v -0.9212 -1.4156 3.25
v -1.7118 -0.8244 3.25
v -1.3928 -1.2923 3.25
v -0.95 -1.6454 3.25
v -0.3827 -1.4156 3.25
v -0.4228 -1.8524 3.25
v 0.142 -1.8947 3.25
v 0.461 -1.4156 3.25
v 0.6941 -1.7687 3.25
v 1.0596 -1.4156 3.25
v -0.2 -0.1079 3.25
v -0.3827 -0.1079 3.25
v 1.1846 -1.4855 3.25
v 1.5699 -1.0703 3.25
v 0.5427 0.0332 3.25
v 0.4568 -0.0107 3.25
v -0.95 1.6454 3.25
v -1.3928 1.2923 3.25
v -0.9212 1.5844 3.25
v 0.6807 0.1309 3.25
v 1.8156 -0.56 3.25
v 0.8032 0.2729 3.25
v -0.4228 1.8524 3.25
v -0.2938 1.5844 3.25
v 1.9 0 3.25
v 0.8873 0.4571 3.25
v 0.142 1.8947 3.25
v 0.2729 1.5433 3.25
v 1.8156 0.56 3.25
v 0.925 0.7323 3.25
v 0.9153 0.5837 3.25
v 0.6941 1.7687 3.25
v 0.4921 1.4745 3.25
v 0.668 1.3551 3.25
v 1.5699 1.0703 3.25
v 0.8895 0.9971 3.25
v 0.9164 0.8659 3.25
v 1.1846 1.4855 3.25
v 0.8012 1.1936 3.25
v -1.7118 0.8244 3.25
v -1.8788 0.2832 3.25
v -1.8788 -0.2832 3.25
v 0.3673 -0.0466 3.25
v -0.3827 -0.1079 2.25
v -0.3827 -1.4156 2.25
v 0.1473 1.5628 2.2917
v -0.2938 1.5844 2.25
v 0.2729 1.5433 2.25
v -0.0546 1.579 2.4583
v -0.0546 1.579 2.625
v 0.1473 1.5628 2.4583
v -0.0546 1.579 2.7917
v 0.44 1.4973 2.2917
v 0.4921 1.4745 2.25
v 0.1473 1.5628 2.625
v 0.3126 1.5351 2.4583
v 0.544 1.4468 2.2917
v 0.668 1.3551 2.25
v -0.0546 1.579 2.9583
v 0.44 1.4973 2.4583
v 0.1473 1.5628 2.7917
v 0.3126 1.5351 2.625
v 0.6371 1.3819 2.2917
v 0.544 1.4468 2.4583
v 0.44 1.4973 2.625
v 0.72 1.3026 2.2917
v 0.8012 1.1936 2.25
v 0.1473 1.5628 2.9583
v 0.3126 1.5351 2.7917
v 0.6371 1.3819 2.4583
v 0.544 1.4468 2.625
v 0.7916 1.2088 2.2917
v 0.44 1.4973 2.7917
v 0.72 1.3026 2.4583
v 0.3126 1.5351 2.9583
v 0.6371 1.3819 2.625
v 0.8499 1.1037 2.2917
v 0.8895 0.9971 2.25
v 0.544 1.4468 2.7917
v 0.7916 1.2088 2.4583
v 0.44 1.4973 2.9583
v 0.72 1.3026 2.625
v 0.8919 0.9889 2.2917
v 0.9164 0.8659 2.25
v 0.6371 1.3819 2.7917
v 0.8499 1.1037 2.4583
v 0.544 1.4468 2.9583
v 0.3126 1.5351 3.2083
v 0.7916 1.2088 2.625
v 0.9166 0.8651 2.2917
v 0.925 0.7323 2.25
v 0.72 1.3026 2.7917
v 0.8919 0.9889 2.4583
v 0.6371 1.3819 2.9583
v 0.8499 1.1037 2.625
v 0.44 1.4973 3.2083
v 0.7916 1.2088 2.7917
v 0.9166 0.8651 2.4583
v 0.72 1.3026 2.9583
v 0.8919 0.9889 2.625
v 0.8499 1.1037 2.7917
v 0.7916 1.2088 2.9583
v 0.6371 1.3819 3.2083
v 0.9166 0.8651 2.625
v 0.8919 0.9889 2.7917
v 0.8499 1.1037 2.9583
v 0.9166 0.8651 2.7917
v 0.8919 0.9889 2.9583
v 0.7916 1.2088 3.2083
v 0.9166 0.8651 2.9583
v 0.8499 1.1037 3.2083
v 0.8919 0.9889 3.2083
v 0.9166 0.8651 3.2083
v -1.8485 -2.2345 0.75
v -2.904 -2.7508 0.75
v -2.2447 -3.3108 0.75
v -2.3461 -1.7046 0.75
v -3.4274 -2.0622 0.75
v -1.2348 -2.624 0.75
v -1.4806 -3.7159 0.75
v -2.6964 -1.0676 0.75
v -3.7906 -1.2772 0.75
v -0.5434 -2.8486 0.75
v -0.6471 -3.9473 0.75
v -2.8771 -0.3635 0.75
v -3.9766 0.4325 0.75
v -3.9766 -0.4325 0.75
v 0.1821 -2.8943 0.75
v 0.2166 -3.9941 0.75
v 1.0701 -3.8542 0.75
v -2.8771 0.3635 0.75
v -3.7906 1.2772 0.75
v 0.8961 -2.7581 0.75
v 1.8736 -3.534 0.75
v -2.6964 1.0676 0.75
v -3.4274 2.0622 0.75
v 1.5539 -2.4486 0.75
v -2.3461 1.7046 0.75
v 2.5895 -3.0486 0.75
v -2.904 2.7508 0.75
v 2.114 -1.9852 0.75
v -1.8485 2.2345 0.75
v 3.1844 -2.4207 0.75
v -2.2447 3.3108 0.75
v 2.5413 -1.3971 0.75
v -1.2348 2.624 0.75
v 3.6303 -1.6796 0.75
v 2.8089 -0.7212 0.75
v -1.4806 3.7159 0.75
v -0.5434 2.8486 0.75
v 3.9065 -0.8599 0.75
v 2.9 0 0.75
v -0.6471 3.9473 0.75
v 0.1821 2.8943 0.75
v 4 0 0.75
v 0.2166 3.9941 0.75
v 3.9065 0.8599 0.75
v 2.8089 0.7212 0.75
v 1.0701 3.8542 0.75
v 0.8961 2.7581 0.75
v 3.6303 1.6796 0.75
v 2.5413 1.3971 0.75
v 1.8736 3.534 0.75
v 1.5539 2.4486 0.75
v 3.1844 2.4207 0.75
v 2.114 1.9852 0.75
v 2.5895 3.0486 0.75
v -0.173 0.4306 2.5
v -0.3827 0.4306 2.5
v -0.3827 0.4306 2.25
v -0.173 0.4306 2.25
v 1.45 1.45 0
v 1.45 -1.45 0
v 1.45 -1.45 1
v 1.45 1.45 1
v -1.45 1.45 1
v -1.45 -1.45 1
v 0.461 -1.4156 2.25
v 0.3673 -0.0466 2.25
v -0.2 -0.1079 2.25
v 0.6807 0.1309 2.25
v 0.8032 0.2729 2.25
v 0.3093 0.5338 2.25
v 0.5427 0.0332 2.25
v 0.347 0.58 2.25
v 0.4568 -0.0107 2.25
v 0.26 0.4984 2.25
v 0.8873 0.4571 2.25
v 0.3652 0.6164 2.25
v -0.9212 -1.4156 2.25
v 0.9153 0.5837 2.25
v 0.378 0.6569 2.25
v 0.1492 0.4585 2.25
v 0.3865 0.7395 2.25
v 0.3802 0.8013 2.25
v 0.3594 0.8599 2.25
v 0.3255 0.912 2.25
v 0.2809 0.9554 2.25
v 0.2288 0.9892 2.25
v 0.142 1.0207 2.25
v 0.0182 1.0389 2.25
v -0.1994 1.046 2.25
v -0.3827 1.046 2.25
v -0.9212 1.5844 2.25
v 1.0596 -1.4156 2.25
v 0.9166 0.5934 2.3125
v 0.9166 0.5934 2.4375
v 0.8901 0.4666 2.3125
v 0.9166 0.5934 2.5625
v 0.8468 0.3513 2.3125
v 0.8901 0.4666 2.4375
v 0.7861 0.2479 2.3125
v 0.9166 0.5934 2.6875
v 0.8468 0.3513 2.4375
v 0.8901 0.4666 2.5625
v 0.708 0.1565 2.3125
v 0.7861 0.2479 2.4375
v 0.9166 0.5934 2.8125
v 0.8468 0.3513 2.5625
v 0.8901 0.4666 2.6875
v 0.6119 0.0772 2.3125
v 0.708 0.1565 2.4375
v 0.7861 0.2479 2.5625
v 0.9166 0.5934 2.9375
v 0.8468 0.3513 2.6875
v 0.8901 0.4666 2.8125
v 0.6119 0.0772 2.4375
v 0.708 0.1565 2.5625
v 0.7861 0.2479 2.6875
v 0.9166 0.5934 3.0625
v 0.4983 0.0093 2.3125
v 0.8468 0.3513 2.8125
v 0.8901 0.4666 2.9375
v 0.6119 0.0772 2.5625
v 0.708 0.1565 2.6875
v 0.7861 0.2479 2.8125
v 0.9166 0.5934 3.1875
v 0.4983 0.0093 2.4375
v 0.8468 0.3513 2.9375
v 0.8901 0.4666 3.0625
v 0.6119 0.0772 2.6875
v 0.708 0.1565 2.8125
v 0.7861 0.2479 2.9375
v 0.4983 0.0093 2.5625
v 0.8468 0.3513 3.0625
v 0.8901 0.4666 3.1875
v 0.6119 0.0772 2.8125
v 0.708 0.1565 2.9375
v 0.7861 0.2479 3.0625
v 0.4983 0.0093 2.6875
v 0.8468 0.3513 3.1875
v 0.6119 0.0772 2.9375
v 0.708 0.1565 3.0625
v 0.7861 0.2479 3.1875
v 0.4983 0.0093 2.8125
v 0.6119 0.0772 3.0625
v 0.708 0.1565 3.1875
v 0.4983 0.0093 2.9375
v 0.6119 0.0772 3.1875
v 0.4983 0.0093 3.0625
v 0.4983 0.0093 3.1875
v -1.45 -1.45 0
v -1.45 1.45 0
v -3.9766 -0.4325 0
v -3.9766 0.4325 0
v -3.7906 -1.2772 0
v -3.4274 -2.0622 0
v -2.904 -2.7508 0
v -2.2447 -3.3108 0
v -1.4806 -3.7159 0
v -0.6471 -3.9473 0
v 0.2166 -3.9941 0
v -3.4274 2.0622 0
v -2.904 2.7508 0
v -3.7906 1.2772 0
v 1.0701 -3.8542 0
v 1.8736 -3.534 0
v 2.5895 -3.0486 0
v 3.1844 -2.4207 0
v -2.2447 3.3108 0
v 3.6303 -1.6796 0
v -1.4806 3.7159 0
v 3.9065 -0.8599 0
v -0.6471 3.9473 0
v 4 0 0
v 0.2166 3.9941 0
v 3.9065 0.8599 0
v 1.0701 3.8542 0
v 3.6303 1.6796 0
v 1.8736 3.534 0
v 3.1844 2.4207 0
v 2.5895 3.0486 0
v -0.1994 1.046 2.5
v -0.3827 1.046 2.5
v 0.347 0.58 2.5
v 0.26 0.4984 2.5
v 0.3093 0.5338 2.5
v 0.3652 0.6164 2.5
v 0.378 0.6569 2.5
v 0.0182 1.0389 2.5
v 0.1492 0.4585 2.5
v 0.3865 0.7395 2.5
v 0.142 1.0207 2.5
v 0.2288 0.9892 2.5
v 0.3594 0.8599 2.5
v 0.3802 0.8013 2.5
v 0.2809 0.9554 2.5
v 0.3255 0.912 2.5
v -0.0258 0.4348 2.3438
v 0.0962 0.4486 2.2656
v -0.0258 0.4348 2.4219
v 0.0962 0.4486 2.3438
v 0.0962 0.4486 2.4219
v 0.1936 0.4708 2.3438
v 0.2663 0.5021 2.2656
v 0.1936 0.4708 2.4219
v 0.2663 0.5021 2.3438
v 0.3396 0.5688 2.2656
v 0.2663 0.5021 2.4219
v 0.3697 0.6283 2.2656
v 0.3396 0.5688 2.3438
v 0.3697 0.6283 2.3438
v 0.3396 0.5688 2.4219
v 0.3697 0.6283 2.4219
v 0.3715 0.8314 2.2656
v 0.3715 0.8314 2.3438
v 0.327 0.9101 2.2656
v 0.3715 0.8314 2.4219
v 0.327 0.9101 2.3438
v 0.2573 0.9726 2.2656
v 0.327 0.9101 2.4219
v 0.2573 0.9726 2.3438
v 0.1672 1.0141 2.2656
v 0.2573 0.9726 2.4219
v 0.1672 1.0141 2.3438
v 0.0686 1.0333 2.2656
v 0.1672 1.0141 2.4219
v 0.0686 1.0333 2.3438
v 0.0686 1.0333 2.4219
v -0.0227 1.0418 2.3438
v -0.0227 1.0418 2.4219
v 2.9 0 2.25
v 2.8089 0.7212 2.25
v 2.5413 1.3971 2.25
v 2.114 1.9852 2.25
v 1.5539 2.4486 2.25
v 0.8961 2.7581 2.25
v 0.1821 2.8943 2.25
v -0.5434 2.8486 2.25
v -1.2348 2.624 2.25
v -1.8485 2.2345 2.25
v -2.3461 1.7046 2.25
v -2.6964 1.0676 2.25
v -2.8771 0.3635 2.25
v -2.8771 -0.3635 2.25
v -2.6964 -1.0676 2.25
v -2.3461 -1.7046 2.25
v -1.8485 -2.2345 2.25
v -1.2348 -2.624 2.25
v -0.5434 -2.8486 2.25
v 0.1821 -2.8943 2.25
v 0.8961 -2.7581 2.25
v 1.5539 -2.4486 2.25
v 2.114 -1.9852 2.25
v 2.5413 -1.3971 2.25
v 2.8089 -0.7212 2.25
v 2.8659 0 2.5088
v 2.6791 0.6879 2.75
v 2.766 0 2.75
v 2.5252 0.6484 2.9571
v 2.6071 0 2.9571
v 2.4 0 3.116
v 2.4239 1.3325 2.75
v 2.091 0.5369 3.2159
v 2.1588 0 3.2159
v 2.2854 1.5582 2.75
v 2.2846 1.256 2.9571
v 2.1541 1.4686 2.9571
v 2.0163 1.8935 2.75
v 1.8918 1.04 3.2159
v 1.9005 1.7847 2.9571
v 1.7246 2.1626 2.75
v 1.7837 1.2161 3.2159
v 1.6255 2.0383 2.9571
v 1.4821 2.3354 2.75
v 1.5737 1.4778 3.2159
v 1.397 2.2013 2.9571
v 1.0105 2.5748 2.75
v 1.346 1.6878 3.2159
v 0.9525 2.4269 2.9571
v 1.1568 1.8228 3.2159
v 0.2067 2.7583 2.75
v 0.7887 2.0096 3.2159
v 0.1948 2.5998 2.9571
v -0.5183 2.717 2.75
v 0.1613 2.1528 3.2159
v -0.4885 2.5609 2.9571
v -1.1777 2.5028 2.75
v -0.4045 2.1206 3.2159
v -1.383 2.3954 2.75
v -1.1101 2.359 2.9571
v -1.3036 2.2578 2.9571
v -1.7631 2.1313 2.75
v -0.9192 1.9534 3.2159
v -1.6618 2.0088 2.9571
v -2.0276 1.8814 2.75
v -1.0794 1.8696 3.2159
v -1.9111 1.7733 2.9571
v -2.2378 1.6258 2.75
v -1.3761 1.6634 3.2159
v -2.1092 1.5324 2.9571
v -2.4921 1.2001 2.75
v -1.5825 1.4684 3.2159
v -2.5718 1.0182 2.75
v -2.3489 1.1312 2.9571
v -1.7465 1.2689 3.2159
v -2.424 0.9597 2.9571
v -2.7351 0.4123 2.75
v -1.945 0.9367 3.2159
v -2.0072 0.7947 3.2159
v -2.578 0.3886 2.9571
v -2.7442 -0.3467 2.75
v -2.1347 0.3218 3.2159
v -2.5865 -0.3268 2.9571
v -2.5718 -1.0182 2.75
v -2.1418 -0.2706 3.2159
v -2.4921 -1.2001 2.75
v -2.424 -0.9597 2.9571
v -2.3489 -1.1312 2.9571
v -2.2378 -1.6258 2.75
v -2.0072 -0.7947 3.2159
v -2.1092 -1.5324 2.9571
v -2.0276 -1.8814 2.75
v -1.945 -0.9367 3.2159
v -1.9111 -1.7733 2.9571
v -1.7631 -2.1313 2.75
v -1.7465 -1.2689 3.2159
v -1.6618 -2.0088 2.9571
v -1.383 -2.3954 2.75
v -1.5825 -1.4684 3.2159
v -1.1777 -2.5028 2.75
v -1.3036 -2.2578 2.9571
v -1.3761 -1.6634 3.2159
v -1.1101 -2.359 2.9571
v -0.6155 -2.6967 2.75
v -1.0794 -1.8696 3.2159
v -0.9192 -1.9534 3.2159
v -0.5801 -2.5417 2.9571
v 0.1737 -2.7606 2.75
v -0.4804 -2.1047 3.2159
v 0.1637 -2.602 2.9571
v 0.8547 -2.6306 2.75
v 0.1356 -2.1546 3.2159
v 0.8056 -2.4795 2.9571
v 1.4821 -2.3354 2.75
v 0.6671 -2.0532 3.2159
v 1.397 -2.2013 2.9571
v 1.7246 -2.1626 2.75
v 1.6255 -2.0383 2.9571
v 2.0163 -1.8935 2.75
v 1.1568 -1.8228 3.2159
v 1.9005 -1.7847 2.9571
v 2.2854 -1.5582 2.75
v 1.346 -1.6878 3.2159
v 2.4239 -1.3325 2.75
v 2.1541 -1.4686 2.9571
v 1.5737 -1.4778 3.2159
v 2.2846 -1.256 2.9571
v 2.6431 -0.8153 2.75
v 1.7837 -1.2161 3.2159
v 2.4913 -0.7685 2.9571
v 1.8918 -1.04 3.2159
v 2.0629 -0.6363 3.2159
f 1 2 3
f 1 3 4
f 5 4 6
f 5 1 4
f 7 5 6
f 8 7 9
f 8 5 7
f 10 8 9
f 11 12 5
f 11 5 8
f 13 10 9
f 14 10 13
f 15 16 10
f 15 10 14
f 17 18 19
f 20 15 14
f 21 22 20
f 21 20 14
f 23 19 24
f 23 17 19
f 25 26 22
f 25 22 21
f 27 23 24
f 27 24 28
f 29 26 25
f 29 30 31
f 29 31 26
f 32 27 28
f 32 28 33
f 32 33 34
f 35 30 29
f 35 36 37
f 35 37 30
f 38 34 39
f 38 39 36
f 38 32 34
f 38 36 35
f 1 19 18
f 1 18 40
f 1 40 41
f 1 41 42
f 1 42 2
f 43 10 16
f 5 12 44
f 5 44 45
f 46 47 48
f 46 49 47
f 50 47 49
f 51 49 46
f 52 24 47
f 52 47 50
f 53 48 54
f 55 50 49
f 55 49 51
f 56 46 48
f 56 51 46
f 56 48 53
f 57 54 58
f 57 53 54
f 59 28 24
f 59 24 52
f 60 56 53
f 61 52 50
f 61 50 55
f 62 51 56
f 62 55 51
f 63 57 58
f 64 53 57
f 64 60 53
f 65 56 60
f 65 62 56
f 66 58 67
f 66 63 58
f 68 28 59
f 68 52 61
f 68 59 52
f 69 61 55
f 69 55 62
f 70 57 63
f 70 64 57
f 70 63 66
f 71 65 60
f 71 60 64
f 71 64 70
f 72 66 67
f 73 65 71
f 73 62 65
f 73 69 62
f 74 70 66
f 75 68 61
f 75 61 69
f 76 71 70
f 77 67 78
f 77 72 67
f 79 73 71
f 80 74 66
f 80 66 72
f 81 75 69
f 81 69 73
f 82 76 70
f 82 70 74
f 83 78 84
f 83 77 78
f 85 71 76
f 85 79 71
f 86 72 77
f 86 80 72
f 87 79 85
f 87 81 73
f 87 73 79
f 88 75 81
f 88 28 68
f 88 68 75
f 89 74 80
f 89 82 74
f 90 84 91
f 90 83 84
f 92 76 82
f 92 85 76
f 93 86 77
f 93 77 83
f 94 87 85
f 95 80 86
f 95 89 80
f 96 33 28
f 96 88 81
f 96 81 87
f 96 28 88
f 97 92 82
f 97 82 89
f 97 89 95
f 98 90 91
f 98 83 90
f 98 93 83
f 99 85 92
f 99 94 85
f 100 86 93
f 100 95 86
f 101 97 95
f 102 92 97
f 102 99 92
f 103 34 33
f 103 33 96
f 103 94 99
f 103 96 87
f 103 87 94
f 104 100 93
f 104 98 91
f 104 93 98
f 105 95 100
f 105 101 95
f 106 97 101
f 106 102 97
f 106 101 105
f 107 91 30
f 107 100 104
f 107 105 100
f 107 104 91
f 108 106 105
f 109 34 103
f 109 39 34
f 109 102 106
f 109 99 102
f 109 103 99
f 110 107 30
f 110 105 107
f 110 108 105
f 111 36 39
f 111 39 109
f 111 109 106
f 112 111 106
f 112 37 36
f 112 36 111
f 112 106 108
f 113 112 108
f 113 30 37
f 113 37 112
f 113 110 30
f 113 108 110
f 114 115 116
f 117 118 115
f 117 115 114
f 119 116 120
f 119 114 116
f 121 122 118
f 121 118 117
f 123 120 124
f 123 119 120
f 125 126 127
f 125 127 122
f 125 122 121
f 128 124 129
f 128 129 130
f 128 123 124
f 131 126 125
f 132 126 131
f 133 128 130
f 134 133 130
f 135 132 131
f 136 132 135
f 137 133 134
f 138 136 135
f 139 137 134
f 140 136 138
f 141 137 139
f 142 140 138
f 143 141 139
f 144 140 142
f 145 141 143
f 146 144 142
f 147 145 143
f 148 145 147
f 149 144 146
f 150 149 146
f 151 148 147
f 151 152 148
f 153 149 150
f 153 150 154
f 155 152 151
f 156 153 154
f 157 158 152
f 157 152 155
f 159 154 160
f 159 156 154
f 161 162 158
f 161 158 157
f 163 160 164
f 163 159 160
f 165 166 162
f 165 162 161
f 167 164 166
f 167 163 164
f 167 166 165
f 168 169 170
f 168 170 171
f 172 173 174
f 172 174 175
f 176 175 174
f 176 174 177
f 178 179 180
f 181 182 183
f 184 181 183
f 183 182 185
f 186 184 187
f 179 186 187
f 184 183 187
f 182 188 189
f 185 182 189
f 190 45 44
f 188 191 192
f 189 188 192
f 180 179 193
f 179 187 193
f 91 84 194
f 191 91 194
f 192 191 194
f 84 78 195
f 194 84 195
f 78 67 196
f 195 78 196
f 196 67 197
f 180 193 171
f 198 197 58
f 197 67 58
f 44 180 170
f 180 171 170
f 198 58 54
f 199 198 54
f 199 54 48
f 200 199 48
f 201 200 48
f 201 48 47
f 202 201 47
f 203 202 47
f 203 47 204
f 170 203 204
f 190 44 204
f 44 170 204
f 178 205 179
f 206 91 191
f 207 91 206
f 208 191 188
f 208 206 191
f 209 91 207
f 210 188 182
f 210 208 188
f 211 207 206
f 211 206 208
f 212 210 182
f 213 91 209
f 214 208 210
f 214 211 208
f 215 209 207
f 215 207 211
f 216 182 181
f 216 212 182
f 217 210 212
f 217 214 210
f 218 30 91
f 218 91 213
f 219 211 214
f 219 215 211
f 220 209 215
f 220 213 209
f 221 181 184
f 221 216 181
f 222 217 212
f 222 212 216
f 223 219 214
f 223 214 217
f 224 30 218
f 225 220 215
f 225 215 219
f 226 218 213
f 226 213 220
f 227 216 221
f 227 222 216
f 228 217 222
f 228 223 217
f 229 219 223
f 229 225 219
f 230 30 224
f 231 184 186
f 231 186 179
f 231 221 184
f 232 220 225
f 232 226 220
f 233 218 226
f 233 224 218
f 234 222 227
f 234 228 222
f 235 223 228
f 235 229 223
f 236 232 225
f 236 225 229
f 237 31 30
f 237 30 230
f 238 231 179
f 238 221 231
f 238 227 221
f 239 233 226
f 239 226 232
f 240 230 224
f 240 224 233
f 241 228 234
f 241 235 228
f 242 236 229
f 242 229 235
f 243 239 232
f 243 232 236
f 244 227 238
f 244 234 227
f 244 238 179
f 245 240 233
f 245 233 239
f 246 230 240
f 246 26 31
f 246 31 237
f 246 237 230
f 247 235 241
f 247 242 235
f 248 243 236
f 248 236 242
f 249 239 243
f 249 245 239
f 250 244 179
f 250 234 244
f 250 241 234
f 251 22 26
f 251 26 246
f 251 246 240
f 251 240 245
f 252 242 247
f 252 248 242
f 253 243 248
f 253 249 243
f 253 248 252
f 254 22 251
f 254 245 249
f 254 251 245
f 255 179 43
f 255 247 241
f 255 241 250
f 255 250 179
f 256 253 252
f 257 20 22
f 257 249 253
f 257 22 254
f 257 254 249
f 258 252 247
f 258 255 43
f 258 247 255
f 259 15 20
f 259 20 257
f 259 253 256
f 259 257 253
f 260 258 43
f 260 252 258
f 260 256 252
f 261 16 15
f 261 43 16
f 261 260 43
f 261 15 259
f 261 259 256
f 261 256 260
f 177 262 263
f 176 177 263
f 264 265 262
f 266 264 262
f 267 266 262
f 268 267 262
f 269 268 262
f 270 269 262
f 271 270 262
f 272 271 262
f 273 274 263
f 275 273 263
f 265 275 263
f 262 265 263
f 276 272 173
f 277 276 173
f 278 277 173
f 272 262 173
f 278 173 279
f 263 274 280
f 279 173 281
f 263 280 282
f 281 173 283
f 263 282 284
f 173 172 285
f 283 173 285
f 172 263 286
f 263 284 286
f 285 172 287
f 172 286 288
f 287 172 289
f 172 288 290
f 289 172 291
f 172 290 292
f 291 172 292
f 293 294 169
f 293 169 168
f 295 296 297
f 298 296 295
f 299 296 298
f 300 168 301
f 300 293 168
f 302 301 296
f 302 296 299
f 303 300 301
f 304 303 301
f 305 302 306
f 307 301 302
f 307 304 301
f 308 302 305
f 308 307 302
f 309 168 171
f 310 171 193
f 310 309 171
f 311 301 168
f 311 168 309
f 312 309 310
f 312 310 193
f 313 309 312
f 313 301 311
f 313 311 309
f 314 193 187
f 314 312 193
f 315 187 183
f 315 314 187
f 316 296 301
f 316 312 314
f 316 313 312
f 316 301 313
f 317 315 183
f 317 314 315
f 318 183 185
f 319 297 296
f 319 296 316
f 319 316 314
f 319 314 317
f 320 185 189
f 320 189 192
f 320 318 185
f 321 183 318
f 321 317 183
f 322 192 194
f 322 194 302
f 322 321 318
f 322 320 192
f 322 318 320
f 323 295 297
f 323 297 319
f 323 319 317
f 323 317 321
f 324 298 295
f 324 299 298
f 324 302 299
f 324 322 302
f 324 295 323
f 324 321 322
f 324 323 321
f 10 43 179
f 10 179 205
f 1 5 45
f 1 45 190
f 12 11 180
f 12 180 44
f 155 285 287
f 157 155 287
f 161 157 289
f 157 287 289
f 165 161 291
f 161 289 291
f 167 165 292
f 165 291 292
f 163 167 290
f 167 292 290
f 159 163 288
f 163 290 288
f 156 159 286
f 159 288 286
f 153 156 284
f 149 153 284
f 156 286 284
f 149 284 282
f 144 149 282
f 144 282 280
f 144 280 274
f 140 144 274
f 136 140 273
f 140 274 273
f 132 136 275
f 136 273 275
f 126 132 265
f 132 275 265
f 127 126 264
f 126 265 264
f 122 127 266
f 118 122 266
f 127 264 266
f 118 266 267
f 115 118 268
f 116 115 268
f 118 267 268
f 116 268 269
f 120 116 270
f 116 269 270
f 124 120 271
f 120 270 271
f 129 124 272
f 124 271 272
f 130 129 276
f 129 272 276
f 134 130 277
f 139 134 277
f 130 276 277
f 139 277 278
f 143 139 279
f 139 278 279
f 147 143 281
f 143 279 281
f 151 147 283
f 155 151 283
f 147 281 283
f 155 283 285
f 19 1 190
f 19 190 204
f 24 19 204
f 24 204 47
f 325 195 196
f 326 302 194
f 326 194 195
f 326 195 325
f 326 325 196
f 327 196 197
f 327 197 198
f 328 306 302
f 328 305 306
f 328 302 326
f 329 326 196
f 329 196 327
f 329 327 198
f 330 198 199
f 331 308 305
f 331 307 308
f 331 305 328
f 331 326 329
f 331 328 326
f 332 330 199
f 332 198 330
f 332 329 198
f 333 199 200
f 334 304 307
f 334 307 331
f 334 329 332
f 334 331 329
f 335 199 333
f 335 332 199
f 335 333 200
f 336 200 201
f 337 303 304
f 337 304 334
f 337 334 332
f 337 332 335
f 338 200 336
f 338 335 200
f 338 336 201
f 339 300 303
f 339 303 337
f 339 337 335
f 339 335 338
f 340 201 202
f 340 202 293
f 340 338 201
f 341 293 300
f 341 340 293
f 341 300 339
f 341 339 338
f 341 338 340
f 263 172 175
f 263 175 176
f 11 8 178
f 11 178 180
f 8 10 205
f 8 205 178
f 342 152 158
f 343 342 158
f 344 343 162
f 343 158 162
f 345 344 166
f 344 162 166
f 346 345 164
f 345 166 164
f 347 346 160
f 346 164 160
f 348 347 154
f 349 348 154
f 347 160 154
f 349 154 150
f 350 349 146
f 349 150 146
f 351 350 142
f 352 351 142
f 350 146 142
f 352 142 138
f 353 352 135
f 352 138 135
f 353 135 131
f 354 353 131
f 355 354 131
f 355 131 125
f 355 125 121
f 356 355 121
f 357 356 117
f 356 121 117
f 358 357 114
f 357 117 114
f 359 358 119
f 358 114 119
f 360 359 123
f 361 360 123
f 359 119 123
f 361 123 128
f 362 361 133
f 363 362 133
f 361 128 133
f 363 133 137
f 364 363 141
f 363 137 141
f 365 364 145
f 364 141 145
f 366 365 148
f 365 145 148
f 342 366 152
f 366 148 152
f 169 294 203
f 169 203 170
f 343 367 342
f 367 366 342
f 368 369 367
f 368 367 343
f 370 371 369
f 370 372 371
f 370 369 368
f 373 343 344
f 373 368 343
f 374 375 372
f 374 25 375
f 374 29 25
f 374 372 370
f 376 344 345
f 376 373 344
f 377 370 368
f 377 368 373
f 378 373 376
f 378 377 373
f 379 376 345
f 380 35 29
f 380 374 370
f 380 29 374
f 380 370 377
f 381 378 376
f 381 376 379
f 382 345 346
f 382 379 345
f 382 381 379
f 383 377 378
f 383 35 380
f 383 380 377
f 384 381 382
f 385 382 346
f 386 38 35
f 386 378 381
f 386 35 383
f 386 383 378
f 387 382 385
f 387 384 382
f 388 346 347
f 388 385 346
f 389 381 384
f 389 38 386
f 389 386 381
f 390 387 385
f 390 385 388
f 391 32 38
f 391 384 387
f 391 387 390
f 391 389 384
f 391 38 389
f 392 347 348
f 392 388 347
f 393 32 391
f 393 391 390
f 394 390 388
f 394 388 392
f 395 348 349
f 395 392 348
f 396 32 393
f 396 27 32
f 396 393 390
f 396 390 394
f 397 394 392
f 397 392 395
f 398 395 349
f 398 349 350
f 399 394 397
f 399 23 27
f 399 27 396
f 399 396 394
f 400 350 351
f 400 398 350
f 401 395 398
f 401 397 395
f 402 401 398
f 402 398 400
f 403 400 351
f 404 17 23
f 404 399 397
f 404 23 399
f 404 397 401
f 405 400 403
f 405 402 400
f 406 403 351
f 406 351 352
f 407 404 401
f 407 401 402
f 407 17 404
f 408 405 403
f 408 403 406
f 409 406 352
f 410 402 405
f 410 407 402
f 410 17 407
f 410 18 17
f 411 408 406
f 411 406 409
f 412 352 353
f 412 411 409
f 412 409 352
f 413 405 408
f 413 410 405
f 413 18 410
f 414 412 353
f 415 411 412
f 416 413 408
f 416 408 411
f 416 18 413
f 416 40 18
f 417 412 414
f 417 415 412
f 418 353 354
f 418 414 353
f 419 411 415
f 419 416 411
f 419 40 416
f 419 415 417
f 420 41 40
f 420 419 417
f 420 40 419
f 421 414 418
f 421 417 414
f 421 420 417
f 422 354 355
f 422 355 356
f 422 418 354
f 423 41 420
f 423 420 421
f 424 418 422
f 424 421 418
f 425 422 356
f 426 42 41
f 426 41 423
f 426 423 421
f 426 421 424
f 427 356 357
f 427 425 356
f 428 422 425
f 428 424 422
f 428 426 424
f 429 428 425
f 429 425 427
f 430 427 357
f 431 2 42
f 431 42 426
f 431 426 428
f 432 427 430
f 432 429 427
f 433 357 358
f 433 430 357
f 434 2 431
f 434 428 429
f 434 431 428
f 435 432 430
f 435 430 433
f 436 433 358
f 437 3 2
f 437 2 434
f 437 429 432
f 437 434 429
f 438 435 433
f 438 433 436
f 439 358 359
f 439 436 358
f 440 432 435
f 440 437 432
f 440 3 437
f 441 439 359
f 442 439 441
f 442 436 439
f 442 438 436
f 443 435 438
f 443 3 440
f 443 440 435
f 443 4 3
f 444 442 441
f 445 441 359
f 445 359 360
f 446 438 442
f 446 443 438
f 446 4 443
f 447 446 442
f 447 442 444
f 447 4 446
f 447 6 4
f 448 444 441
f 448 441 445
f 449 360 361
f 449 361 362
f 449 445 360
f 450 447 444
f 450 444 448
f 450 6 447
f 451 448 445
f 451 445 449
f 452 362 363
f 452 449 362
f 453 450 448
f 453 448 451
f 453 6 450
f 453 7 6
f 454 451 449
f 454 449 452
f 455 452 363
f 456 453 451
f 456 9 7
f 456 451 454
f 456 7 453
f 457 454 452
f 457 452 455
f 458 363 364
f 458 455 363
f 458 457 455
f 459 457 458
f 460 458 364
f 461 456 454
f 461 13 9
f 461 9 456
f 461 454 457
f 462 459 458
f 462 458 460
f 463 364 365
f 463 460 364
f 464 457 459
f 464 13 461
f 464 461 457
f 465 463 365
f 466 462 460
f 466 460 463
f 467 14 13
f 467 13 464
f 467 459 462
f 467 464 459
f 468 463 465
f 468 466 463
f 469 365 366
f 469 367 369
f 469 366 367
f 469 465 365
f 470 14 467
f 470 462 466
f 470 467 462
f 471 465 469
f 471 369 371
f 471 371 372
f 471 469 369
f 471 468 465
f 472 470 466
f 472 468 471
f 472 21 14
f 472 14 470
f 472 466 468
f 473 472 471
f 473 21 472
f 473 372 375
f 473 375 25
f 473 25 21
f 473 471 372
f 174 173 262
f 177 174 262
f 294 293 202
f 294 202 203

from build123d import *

# Parameters (mm, degrees)
SZKIC1_R                    = 4
DODANIE_WYCI_GNI_CIE1_DEPTH = 0.75
SZKIC2_R                    = 2.9
DODANIE_WYCI_GNI_CIE2_DEPTH = 2.5
SZKIC3_W                    = 2.5
SZKIC3_H                    = 2.5
WYTNIJ_WYCI_GNI_CIE1_DEPTH  = 1
ZAOKR_GLENIE2_R             = 1
SZKIC4_W                    = 2.9
SZKIC4_H                    = 2.9
WYTNIJ_WYCI_GNI_CIE2_DEPTH  = 1
WYTNIJ_WYCI_GNI_CIE3_DEPTH  = 1
WYTNIJ_WYCI_GNI_CIE4_DEPTH  = 0.75


with BuildPart() as part:
    # Szkic1 → Dodanie-wyciągnięcie1 (new body)
    with BuildSketch(Plane.XY):
        Circle(SZKIC1_R)
    extrude(amount=DODANIE_WYCI_GNI_CIE1_DEPTH)

    # Szkic2 → Dodanie-wyciągnięcie2 (add)
    with BuildSketch(Plane.XY.offset(0.75)):
        Circle(SZKIC2_R)
    extrude(amount=DODANIE_WYCI_GNI_CIE2_DEPTH)

    # Szkic3 → Wytnij-wyciągnięcie1 (cut)
    with BuildSketch(Plane(origin=(0, 0, 0), x_dir=(-1, 0, 0), z_dir=(0, 0, -1))):
        Rectangle(SZKIC3_W, SZKIC3_H)
    extrude(amount=-WYTNIJ_WYCI_GNI_CIE1_DEPTH, mode=Mode.SUBTRACT)

    # Zaokrąglenie2
    zaokr_glenie2_edges = [part.edges().sort_by_distance(p)[0] for p in [
        (-2.9, 0, 3.25),
    ]]
    fillet(zaokr_glenie2_edges, radius=ZAOKR_GLENIE2_R)

    # Szkic4 → Wytnij-wyciągnięcie2 (cut)
    with BuildSketch(Plane(origin=(0, 0, 0), x_dir=(-1, 0, 0), z_dir=(0, 0, -1))):
        Rectangle(SZKIC4_W, SZKIC4_H)
    extrude(amount=-WYTNIJ_WYCI_GNI_CIE2_DEPTH, mode=Mode.SUBTRACT)

    # Szkic5 → Wytnij-wyciągnięcie3 (cut)
    with BuildSketch(Plane.XY.offset(3.25)):
        with BuildLine():
            Line((-0.921182905, 1.584423241), (-0.293779059, 1.584423241))
            add(Edge.make_bspline(
                [(-0.293779059, 1.584423241), (-0.252307855, 1.584276042), (-0.17254705, 1.583992937), (-0.057536324, 1.579526289), (0.048116843, 1.573310581), (0.144568883, 1.563825246), (0.23177853, 1.551248838), (0.309833189, 1.536423335), (0.378730579, 1.519526495), (0.439051754, 1.4984717), (0.493488632, 1.47472221), (0.54423137, 1.44743361), (0.592399429, 1.416909768), (0.637670857, 1.382347519), (0.680439074, 1.344368629), (0.720784764, 1.302934869), (0.758137806, 1.257694897), (0.792266907, 1.208934573), (0.823372836, 1.15763983), (0.850863953, 1.10374024), (0.873219776, 1.04719832), (0.892973541, 0.988831223), (0.907201538, 0.927804579), (0.917096902, 0.864712494), (0.924341901, 0.799332876), (0.924758453, 0.754916866), (0.924970941, 0.73225978)],
                knots=[0, 0, 0, 0, 1.749336639, 3.364467119, 4.854658419, 6.213483162, 7.451590619, 8.570285859, 9.5643256, 10.440900261, 11.26203566, 12.067320669, 12.869050712, 13.665104639, 14.467235401, 15.27997916, 16.102287765, 16.939272006, 17.78853747, 18.631303466, 19.488103222, 20.351255419, 21.228522269, 22.127379805, 23.044756219, 24, 24, 24, 24], degree=3))
            add(Edge.make_bspline(
                [(0.924970941, 0.73225978), (0.924418974, 0.708610987), (0.923336666, 0.662240014), (0.917506767, 0.594124836), (0.906851544, 0.528956999), (0.890712658, 0.466927305), (0.872163104, 0.407263723), (0.847496956, 0.351067083), (0.819658771, 0.297520087), (0.786596171, 0.247380176), (0.750311583, 0.199533643), (0.70811337, 0.155813667), (0.662735328, 0.113870465), (0.611626594, 0.076331215), (0.557040086, 0.040657651), (0.497891228, 0.008327901), (0.434566047, -0.021470729), (0.390045308, -0.038088504), (0.367278634, -0.046586374)],
                knots=[0, 0, 0, 0, 1.099860209, 2.156625411, 3.176576793, 4.16617041, 5.135385252, 6.078461593, 7.016046972, 7.938469504, 8.868247731, 9.803980173, 10.76021508, 11.73834243, 12.748633912, 13.790971185, 14.870363756, 16, 16, 16, 16], degree=3))
            Line((0.367278634, -0.046586374), (1.059586326, -1.415576759))
            Line((1.059586326, -1.415576759), (0.461028634, -1.415576759))
            Line((0.461028634, -1.415576759), (-0.200029059, -0.107884451))
            Line((-0.200029059, -0.107884451), (-0.382721366, -0.107884451))
            Line((-0.382721366, -0.107884451), (-0.382721366, -1.415576759))
            Line((-0.382721366, -1.415576759), (-0.921182905, -1.415576759))
            Line((-0.921182905, -1.415576759), (-0.921182905, 1.584423241))
        make_face()
        with BuildLine():
            Line((-0.382721366, 0.430577087), (-0.172985789, 0.430577087))
            add(Edge.make_bspline(
                [(-0.172985789, 0.430577087), (-0.147343872, 0.430865884), (-0.098245109, 0.431418867), (-0.02763464, 0.433983833), (0.036496506, 0.440164132), (0.09442373, 0.44797271), (0.146438515, 0.456988841), (0.192076908, 0.469909503), (0.232042127, 0.48375432), (0.265860584, 0.500959836), (0.294754296, 0.520526239), (0.319702167, 0.54275416), (0.340337634, 0.568480148), (0.357321675, 0.597005082), (0.370533413, 0.628581257), (0.38017697, 0.66286204), (0.385566291, 0.700237931), (0.386186351, 0.726032386), (0.386509403, 0.739471318)],
                knots=[0, 0, 0, 0, 1.688639943, 3.233382647, 4.650958383, 5.928841754, 7.082724185, 8.122798841, 9.049171256, 9.863274652, 10.613301712, 11.341792392, 12.054588806, 12.776240173, 13.521029143, 14.301969904, 15.115324896, 16, 16, 16, 16], degree=3))
            add(Edge.make_bspline(
                [(0.386509403, 0.739471318), (0.385898644, 0.755370556), (0.384698922, 0.786601663), (0.372793947, 0.831563506), (0.353843798, 0.873178768), (0.327868335, 0.911259421), (0.295155616, 0.94464355), (0.257615189, 0.974071926), (0.214436843, 0.997341683), (0.174456944, 1.012690168), (0.138084581, 1.021873324), (0.10525967, 1.028716531), (0.067248226, 1.033566508), (0.024021552, 1.038710772), (-0.024310165, 1.042046567), (-0.078010364, 1.044481033), (-0.136924816, 1.045477092), (-0.177993785, 1.045795515), (-0.199428097, 1.045961703)],
                knots=[0, 0, 0, 0, 1.020303359, 2.004196876, 2.966617323, 3.9489082, 4.950758222, 5.960522915, 7.003732012, 8.091992268, 8.70421221, 9.413913587, 10.24622431, 11.166358409, 12.212345909, 13.359657661, 14.621978493, 16, 16, 16, 16], degree=3))
            Line((-0.199428097, 1.045961703), (-0.382721366, 1.045961703))
            Line((-0.382721366, 1.045961703), (-0.382721366, 0.430577087))
        make_face(mode=Mode.SUBTRACT)
    extrude(amount=-WYTNIJ_WYCI_GNI_CIE3_DEPTH, mode=Mode.SUBTRACT)

    # Szkic6 → Wytnij-wyciągnięcie4 (cut)
    with BuildSketch(Plane.XY.offset(3.25)):
        with BuildLine():
            Line((-0.199428097, 1.045961703), (-0.382721366, 1.045961703))
            Line((-0.382721366, 1.045961703), (-0.382721366, 0.430577087))
            Line((-0.382721366, 0.430577087), (-0.172985789, 0.430577087))
            add(Edge.make_bspline(
                [(-0.172985789, 0.430577087), (-0.147343872, 0.430865884), (-0.098245109, 0.431418867), (-0.02763464, 0.433983833), (0.036496506, 0.440164132), (0.09442373, 0.44797271), (0.146438515, 0.456988841), (0.192076908, 0.469909503), (0.232042127, 0.48375432), (0.265860584, 0.500959836), (0.294754296, 0.520526239), (0.319702167, 0.54275416), (0.340337634, 0.568480148), (0.357321675, 0.597005082), (0.370533413, 0.628581257), (0.38017697, 0.66286204), (0.385566291, 0.700237931), (0.386186351, 0.726032386), (0.386509403, 0.739471318)],
                knots=[0, 0, 0, 0, 0.105539996, 0.202086415, 0.290684899, 0.37055261, 0.442670262, 0.507674928, 0.565573203, 0.616454666, 0.663331357, 0.708862024, 0.7534118, 0.798515011, 0.845064321, 0.893873119, 0.944707806, 1, 1, 1, 1], degree=3))
            add(Edge.make_bspline(
                [(0.386509403, 0.739471318), (0.385898644, 0.755370556), (0.384698922, 0.786601663), (0.372793947, 0.831563506), (0.353843798, 0.873178768), (0.327868335, 0.911259421), (0.295155616, 0.94464355), (0.257615189, 0.974071926), (0.214436843, 0.997341683), (0.174456944, 1.012690168), (0.138084581, 1.021873324), (0.10525967, 1.028716531), (0.067248226, 1.033566508), (0.024021552, 1.038710772), (-0.024310165, 1.042046567), (-0.078010364, 1.044481033), (-0.136924816, 1.045477092), (-0.177993785, 1.045795515), (-0.199428097, 1.045961703)],
                knots=[0, 0, 0, 0, 0.06376896, 0.125262305, 0.185413583, 0.246806762, 0.309422389, 0.372532682, 0.437733251, 0.505749517, 0.544013263, 0.588369599, 0.640389019, 0.697897401, 0.763271619, 0.834978604, 0.913873656, 1, 1, 1, 1], degree=3))
        make_face()
    extrude(amount=-WYTNIJ_WYCI_GNI_CIE4_DEPTH, mode=Mode.SUBTRACT)


solid = part.part
